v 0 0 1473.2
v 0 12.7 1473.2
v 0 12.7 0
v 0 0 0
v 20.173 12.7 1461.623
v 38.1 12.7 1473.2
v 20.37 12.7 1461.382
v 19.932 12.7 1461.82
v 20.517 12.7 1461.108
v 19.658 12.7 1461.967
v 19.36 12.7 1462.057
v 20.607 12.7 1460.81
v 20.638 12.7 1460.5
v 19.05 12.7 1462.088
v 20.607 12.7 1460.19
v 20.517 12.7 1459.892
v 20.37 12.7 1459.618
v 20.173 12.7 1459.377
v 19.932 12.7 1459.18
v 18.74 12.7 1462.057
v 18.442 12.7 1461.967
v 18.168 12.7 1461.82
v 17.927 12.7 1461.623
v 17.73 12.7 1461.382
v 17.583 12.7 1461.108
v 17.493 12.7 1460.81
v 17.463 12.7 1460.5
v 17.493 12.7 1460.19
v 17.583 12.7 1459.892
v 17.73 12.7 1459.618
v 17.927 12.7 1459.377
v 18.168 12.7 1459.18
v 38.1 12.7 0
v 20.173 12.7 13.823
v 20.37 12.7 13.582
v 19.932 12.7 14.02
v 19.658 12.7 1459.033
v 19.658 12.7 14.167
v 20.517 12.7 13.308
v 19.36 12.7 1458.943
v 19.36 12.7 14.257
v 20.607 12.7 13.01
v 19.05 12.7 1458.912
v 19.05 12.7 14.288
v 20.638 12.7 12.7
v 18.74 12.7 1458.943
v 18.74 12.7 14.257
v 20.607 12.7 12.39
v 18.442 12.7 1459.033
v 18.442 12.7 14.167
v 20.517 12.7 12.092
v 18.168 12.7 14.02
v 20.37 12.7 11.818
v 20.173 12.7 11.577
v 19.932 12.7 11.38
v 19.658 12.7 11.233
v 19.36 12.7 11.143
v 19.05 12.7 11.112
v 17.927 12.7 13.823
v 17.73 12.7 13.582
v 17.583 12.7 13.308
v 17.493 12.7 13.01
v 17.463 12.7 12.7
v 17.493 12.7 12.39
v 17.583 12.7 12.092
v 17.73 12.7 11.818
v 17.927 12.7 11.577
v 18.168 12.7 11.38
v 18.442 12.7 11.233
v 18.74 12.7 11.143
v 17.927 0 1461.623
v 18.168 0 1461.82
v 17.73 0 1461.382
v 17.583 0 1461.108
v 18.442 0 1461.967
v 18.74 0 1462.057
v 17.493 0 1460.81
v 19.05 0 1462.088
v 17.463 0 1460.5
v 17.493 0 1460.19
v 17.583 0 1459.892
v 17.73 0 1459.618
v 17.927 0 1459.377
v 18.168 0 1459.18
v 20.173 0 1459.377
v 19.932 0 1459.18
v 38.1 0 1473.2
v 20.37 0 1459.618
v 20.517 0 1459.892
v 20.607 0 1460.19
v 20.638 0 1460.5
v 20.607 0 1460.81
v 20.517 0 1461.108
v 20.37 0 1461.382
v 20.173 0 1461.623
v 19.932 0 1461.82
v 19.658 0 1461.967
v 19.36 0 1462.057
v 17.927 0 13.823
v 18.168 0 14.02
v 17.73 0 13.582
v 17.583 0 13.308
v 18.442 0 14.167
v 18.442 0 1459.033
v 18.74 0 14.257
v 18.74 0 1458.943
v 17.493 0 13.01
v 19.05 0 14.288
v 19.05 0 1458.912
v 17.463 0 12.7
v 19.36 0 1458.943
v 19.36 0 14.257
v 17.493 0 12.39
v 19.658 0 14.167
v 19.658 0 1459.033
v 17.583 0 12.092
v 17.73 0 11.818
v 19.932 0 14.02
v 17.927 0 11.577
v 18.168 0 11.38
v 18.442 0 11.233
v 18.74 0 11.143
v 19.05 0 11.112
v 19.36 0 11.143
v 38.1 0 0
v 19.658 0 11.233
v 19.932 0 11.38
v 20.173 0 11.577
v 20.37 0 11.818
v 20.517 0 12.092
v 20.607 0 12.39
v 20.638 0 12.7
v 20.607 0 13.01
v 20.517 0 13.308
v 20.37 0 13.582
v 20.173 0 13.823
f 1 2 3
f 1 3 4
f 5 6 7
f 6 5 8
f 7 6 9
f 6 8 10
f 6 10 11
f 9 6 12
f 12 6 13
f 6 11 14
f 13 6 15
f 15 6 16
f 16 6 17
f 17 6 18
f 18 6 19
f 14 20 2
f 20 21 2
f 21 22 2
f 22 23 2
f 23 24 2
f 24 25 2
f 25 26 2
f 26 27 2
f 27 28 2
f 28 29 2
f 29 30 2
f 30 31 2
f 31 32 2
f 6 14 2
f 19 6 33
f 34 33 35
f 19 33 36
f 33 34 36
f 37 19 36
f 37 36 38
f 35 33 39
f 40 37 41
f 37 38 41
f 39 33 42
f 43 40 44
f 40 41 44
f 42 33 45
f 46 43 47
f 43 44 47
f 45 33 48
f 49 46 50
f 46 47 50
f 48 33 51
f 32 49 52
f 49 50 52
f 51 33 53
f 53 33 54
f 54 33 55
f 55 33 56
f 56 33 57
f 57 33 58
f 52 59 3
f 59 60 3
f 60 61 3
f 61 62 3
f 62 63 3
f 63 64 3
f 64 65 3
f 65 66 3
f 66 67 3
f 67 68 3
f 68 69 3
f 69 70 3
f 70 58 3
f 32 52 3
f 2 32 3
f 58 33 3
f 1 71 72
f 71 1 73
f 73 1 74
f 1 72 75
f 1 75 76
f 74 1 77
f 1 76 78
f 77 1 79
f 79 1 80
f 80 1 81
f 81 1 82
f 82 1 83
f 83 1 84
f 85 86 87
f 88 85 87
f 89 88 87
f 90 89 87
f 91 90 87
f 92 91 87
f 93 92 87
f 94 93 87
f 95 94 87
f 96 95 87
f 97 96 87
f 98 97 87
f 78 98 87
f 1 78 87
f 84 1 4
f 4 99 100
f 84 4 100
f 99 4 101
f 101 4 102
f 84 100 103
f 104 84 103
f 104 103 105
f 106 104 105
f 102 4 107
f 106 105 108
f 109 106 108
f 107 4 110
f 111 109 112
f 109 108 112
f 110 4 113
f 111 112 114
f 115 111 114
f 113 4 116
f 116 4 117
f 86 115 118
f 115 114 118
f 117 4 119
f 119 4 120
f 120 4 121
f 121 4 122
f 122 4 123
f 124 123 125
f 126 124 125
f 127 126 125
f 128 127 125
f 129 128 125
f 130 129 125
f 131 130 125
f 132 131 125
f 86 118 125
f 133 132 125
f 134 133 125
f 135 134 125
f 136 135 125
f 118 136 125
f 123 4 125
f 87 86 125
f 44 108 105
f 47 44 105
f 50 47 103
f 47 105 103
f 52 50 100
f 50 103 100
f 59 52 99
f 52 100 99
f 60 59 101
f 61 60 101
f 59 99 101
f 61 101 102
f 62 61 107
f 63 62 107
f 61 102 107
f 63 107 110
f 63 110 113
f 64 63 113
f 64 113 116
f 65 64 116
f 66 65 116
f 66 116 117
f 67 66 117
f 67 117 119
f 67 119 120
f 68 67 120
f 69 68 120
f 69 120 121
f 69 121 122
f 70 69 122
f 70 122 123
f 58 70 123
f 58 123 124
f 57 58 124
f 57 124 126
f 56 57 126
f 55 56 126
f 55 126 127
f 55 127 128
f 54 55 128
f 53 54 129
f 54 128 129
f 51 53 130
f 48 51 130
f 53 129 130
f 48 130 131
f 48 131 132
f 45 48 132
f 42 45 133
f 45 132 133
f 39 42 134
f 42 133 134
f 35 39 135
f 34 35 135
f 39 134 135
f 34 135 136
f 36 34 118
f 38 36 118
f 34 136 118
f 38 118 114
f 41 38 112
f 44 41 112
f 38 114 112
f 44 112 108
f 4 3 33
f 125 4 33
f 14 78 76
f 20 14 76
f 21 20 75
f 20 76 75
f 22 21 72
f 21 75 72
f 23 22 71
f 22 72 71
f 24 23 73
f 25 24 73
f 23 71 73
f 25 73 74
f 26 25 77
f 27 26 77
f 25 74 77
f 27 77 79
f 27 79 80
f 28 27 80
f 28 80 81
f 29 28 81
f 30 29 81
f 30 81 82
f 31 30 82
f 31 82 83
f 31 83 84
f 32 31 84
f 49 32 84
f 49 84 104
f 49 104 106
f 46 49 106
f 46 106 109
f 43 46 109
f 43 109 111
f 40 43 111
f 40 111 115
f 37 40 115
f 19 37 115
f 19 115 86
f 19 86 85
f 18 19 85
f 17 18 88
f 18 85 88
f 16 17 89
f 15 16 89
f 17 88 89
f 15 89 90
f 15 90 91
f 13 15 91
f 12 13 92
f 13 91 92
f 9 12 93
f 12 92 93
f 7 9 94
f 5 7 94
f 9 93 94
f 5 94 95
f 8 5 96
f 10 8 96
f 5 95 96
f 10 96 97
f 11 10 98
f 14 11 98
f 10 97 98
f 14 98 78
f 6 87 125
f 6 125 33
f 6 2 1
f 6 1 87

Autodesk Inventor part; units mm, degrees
ref_plane "YZ Plane" through (0, 0, 0) normal (1, 0, 0) x (0, 1, 0)
ref_plane "XZ Plane" through (0, 0, 0) normal (0, 1, 0) x (-1, 0, 0)
ref_plane "XY Plane" through (0, 0, 0) normal (0, 0, 1) x (1, 0, 0)
sketch "Sketch1" plane through (0, 0, 0) normal (0, 0, 1) x (1, 0, 0)
  line L0 (0, 0) -> (38.1, 0)
  line L1 (38.1, 0) -> (38.1, 12.7)
  line L2 (38.1, 12.7) -> (0, 12.7)
  line L3 (0, 12.7) -> (0, 0)
  dimension "d0" = 38.1
  dimension "d1" = 12.7
extrude "Extrusion1" add sketch "Sketch1" along normal blind 1473.2
sketch "Sketch2" plane through (0, 12.7, 0) normal (0, 1, 0) x (1, 0, 0)
  line L0 (38.1, 0) -> (0, 0) projected
  circle A0 centre (19.05, -12.7) radius 2.2451
  dimension "d4" = 12.7
hole "Hole1" at (19.05, 12.7, 12.7) direction (0, -1, 0) diameter 3.175 end through all
sketch "Sketch3" plane through (0, 12.7, 0) normal (0, 1, 0) x (1, 0, 0)
  line L0 (38.1, -1473.2) -> (0, -1473.2) projected
  circle A0 centre (19.05, -1460.5) radius 2.2451
  dimension "d12" = 12.7
hole "Hole2" at (19.05, 12.7, 1460.5) direction (0, -1, 0) diameter 3.175 end through all
properties part number "2p6fs2" material "Wood (Cherry)"
